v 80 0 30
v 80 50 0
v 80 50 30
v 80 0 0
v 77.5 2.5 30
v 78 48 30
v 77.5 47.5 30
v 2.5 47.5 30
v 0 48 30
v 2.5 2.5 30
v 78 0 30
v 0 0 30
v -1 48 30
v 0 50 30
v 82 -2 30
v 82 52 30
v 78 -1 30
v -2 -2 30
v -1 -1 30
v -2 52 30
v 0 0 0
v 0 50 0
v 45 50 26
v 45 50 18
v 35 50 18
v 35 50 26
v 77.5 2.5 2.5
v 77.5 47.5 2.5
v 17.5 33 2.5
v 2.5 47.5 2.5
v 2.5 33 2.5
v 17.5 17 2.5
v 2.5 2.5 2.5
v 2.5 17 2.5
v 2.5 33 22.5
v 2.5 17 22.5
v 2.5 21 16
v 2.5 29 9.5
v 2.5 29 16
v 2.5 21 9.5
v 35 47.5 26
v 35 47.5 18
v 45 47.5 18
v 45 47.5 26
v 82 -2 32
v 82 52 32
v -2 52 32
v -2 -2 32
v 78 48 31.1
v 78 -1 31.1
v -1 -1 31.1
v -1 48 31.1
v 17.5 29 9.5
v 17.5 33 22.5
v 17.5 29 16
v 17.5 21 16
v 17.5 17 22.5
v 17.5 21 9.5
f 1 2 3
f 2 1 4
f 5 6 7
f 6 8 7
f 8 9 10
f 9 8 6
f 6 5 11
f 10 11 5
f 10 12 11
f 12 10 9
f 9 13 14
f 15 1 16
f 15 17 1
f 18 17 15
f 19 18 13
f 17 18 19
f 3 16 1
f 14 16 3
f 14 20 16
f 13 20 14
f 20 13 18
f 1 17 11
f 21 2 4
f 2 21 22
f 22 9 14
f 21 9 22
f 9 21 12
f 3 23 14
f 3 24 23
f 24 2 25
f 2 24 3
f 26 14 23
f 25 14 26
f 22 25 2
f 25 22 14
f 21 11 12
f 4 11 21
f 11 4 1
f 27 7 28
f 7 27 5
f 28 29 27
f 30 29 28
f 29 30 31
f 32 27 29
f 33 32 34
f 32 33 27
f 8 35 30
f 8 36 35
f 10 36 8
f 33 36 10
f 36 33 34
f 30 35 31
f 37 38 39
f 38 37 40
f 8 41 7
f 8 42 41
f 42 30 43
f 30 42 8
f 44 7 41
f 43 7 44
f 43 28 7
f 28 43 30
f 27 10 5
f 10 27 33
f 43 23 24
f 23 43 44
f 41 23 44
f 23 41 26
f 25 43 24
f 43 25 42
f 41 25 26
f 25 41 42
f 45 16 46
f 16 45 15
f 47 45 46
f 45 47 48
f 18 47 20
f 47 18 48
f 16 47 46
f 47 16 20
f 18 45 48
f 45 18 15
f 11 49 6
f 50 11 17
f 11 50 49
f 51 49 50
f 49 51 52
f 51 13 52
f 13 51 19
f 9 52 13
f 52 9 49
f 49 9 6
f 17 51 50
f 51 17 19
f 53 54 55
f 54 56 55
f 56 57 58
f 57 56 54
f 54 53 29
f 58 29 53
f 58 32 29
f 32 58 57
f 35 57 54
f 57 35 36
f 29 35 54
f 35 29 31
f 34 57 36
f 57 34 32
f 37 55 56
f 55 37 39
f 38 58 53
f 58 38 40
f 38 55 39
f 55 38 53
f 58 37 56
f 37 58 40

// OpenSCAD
// multi-part-assembly.scad
// 高级示例: 多零件装配模式
// 演示 use <> 多文件组合 + show 变量控制 + 颜色可视化
// 本文件是装配文件, 各零件定义在下方 module 中
// 更大的项目建议将每个 module 拆分到单独文件用 use <> 引入

/* [Show Mode] */
show = "assembly";     // "assembly" | "exploded" | "base" | "cover" | "switch"

/* [Dimensions] */
box_w = 80;
box_d = 50;
box_h = 30;
wall_t = 2.5;
lid_t = 2;

/* [Quality] */
$fn = 64;


module base_part() {
    // 底部盒体
    color("SteelBlue", 0.7)
    difference() {
        cube([box_w, box_d, box_h]);
        // 掏空
        translate([wall_t, wall_t, wall_t])
            cube([box_w - 2 * wall_t,
                  box_d - 2 * wall_t,
                  box_h - wall_t + 1]);

        // 前侧电源线开孔
        translate([box_w / 2 - 5, box_d - wall_t - 0.5, box_h / 2 + 3])
            cube([10, wall_t + 1, 8]);
    }
}

module cover_part() {
    // 上盖
    color("LightBlue", 0.5)
    translate([-2, -2, box_h])
    difference() {
        cube([box_w + 4, box_d + 4, lid_t]);

        // 与 base 配合的定位凹槽
        translate([1, 1, -0.1])
            cube([box_w - 2 * wall_t + 4,
                  box_d - 2 * wall_t + 4,
                  1.2]);
    }
}

module switch_bracket() {
    // 开关支架 (内部)
    color("Orange", 0.8)
    translate([wall_t, box_d / 2 - 8, wall_t])
    difference() {
        cube([15, 16, 20]);
        // 开关安装槽
        translate([-1, 4, 7])
            cube([15 + 2, 8, 6.5]);
    }
}

module assembly() {
    // 正常装配位置
    base_part();
    cover_part();
    switch_bracket();
}

module exploded() {
    // 爆炸视图 — 各零件拉开
    explode_z = 15;

    base_part();

    translate([0, 0, box_h + explode_z])
        cover_part();

    translate([30, 0, explode_z])
        switch_bracket();
}


if (show == "base") {
    base_part();
} else if (show == "cover") {
    cover_part();
} else if (show == "switch") {
    switch_bracket();
} else if (show == "exploded") {
    exploded();
} else {
    assembly();
}

// 导出:
// 全部装配: openscad multi-part-assembly.scad -o assembly.stl
// 只导出底座: openscad multi-part-assembly.scad -D 'show="base"' -o base.stl
// 只导出盖子: openscad multi-part-assembly.scad -D 'show="cover"' -o cover.stl
// 爆炸视图 (用于文档): openscad multi-part-assembly.scad -D 'show="exploded"' -o exploded.png --render
